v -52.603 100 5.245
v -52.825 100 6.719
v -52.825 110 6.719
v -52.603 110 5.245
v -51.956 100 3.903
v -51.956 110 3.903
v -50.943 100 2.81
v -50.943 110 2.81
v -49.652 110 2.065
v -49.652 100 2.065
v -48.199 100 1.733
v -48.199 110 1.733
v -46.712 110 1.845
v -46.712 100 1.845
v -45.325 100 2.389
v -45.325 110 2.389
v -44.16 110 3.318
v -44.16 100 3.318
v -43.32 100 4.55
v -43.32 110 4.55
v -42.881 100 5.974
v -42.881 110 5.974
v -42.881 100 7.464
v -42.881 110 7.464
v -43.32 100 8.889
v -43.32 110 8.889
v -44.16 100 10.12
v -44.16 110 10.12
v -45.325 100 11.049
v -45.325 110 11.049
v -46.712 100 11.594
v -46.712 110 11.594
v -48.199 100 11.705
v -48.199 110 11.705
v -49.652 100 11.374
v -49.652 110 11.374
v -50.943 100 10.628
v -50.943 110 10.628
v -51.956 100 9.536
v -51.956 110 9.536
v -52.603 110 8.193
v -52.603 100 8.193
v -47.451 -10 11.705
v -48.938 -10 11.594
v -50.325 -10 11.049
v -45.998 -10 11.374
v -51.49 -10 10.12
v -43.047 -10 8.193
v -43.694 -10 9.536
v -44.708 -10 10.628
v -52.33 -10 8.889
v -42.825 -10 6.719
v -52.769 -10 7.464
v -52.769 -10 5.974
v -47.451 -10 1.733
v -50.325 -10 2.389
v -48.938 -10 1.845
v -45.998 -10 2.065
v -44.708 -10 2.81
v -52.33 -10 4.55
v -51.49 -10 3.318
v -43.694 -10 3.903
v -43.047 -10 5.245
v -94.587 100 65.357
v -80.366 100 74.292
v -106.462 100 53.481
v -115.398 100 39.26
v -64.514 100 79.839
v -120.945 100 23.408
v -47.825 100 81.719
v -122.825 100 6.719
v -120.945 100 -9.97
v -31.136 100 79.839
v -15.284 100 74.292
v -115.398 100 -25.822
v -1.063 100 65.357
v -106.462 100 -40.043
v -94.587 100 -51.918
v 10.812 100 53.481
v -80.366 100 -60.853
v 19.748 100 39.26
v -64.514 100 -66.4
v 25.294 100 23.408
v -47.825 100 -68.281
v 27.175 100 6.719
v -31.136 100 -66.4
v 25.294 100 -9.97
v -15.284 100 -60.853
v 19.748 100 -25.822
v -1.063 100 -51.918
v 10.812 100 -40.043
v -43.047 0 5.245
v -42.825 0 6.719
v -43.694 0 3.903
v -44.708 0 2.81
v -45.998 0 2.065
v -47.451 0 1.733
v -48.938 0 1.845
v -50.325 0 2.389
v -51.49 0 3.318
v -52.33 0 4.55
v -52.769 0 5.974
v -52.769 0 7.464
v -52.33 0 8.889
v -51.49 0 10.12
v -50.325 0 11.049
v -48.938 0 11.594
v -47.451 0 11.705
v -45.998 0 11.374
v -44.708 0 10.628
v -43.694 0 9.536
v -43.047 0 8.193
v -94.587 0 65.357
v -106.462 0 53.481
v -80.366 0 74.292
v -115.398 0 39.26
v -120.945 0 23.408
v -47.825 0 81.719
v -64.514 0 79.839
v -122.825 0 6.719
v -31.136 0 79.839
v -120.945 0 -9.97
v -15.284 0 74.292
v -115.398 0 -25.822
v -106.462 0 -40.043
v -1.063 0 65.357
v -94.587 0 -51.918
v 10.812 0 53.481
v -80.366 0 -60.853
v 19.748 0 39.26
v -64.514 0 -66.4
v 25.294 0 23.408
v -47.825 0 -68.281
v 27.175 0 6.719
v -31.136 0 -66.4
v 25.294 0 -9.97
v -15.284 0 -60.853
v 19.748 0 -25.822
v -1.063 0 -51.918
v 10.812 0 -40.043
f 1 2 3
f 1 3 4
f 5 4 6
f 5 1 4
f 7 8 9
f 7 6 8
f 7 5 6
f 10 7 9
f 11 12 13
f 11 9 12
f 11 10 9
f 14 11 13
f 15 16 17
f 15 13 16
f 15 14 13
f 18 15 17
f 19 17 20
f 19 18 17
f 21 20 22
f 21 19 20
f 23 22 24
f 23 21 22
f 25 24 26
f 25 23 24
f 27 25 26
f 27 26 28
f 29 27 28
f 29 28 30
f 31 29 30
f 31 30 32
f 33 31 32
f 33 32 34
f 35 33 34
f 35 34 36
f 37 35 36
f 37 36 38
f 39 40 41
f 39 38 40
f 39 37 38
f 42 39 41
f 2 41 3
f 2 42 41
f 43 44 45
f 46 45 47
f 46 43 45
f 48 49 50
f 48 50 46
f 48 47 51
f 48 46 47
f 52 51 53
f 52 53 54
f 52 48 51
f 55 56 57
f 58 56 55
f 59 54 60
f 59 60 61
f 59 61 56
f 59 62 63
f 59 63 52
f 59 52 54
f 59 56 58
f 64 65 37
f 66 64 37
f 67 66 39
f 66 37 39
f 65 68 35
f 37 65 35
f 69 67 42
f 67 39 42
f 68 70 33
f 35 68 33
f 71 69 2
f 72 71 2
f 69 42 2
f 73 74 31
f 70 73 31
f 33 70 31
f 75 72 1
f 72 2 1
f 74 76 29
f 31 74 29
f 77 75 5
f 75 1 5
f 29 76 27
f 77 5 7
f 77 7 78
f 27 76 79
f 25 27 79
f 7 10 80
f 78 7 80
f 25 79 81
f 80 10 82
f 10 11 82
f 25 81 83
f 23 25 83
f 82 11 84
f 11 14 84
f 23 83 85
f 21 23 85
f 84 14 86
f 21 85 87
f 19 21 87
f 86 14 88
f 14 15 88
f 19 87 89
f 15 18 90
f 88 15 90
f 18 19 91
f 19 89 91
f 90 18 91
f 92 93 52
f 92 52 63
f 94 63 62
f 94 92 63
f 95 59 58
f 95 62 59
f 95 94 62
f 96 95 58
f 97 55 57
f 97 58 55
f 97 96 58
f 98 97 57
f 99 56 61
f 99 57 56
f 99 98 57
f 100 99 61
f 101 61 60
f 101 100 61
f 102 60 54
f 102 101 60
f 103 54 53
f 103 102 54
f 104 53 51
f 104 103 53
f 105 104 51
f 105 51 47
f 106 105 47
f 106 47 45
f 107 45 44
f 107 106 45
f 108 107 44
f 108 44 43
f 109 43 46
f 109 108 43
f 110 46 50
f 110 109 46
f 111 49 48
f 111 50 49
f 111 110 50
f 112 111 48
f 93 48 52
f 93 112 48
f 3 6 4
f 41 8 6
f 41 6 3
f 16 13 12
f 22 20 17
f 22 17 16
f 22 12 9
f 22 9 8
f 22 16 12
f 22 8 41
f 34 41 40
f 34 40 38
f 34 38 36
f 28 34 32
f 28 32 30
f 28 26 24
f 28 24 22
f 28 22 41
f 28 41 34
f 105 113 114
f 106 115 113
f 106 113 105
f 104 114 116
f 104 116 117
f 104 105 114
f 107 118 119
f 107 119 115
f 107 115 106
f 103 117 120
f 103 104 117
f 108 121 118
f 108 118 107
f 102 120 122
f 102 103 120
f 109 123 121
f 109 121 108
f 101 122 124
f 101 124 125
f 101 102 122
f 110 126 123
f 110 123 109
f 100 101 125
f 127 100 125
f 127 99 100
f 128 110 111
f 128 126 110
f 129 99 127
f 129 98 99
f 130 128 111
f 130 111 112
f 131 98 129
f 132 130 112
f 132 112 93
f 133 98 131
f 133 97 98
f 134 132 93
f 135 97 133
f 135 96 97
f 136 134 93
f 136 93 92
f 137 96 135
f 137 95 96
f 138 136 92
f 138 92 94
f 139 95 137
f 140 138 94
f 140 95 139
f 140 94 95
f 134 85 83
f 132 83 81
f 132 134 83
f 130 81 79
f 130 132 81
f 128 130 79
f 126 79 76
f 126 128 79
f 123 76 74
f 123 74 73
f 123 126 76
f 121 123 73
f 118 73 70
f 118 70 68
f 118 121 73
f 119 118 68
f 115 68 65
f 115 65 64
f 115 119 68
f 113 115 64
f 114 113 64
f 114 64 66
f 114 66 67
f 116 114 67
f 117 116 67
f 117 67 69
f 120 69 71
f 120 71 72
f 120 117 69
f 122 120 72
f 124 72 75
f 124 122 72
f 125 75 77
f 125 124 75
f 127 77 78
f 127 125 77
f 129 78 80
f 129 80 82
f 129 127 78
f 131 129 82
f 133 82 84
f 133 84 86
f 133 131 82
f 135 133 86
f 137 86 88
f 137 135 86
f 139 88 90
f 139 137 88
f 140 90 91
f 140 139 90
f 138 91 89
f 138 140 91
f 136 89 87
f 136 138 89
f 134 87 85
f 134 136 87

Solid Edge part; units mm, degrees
sketch "Sketch1" plane through (0, 0, 0) normal (0, -1, 0) x (1, 0, 0)
  circle A0 centre (-47.8251, 6.7192) radius 75
extrude "Protrusion1" add sketch "Sketch1" against normal blind 100
sketch "Sketch2" plane through (-47.8251, 0, 6.7192) normal (0, -1, 0) x (1, 0, 0)
  circle A0 centre (0, 0) radius 5
extrude "ExtrudedProtrusion_3" add sketch "Sketch2" along normal blind 10
sketch "Sketch3" plane through (-47.8251, 100, 6.7192) normal (0, 1, 0) x (-1, 0, 0)
  circle A0 centre (0, 0) radius 5
extrude "ExtrudedProtrusion_4" add sketch "Sketch3" along normal blind 10
